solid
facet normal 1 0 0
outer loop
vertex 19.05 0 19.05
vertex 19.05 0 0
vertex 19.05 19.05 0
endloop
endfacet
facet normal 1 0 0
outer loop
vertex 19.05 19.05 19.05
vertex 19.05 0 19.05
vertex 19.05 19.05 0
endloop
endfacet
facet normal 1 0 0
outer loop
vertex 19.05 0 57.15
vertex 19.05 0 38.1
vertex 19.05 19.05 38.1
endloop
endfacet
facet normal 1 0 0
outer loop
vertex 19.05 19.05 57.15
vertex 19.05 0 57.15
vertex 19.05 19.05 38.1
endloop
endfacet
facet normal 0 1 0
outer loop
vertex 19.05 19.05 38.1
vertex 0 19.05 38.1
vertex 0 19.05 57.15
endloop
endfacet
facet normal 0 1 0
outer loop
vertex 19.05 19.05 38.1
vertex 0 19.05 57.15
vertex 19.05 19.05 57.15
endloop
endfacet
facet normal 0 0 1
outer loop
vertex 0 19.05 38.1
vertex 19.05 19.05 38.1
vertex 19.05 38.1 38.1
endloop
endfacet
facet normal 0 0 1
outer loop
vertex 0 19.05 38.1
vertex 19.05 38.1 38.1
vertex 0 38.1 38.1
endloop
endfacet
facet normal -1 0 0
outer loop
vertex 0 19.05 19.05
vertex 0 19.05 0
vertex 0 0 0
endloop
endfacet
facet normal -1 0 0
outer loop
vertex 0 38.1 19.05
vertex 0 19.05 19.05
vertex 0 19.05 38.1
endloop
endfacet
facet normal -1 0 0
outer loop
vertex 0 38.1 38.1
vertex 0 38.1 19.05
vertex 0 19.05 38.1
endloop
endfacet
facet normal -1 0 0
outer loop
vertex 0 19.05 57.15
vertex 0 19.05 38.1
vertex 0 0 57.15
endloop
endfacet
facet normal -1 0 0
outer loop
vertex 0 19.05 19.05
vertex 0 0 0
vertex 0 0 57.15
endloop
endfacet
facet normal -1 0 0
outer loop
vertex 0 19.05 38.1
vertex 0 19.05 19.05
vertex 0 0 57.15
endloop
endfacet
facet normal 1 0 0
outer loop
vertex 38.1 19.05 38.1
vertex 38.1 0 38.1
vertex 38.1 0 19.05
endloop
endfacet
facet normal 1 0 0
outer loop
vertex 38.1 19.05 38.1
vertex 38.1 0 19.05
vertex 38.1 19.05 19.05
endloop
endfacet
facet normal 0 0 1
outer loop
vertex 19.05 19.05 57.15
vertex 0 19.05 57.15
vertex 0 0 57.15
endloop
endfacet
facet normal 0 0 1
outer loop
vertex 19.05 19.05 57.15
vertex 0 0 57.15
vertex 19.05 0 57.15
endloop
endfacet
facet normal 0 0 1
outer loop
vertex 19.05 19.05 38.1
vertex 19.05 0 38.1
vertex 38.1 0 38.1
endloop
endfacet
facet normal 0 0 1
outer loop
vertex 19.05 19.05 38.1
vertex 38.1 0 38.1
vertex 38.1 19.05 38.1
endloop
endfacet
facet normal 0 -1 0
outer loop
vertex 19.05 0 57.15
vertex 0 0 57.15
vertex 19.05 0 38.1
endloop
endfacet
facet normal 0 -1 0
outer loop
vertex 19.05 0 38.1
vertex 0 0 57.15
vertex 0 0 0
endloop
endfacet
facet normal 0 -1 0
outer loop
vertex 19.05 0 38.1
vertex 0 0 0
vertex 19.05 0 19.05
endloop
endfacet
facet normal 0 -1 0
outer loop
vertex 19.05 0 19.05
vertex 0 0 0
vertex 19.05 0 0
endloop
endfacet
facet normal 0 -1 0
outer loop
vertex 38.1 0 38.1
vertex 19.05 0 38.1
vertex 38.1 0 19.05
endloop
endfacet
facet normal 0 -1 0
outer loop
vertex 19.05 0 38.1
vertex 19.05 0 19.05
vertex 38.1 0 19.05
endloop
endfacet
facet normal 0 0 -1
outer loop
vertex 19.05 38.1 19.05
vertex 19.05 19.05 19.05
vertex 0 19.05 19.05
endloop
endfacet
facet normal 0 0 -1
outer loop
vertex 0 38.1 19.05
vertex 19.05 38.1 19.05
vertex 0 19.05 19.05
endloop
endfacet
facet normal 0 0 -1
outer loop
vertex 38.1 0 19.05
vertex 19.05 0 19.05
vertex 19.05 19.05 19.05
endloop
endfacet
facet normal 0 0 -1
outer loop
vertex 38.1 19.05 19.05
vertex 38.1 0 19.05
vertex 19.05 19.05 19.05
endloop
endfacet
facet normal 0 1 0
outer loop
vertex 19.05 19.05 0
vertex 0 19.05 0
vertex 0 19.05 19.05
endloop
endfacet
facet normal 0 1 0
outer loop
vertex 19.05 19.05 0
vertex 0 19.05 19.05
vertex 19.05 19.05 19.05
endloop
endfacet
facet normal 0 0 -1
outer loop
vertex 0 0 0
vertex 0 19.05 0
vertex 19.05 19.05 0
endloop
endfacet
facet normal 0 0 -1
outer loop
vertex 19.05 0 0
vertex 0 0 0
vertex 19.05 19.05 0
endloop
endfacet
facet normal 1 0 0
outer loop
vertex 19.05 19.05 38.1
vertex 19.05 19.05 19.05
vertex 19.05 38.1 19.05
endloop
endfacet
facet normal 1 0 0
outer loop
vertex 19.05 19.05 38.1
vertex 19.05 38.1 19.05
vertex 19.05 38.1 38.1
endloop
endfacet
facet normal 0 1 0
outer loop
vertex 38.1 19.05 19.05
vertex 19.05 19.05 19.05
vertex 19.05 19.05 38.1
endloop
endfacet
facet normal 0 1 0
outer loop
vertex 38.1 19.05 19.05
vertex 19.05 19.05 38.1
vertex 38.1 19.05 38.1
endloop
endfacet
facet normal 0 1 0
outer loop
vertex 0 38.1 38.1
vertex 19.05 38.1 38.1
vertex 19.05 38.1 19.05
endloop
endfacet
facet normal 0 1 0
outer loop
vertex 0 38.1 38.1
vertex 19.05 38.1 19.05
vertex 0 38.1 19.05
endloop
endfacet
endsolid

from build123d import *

# Parameters (mm, degrees)
F0_W     = 19.05
F0_H     = 19.05
F1_DEPTH = 57.15
F2_W     = 19.05
F2_H     = 19.05
F3_DEPTH = 19.05
F4_W     = 19.05
F4_H     = 19.05
F5_DEPTH = 19.05


with BuildPart() as f1:
    # F0 (on Top) → F1 (new body)
    with BuildSketch(Plane.XY):
        with Locations((9.525, 9.525)):
            Rectangle(F0_W, F0_H)
    extrude(amount=F1_DEPTH)

    # F2 (on face) → F3 (join)
    with BuildSketch(Plane.YZ.offset(19.05)):
        with Locations((9.525, 28.575)):
            Rectangle(F2_W, F2_H)
    extrude(amount=F3_DEPTH)

    # F4 (on face) → F5 (join)
    with BuildSketch(Plane(origin=(0, 19.05, 0), x_dir=(-1, 0, 0), z_dir=(0, 1, 0))):
        with Locations((-9.525, 28.575)):
            Rectangle(F4_W, F4_H)
    extrude(amount=F5_DEPTH)


solid = f1.part
